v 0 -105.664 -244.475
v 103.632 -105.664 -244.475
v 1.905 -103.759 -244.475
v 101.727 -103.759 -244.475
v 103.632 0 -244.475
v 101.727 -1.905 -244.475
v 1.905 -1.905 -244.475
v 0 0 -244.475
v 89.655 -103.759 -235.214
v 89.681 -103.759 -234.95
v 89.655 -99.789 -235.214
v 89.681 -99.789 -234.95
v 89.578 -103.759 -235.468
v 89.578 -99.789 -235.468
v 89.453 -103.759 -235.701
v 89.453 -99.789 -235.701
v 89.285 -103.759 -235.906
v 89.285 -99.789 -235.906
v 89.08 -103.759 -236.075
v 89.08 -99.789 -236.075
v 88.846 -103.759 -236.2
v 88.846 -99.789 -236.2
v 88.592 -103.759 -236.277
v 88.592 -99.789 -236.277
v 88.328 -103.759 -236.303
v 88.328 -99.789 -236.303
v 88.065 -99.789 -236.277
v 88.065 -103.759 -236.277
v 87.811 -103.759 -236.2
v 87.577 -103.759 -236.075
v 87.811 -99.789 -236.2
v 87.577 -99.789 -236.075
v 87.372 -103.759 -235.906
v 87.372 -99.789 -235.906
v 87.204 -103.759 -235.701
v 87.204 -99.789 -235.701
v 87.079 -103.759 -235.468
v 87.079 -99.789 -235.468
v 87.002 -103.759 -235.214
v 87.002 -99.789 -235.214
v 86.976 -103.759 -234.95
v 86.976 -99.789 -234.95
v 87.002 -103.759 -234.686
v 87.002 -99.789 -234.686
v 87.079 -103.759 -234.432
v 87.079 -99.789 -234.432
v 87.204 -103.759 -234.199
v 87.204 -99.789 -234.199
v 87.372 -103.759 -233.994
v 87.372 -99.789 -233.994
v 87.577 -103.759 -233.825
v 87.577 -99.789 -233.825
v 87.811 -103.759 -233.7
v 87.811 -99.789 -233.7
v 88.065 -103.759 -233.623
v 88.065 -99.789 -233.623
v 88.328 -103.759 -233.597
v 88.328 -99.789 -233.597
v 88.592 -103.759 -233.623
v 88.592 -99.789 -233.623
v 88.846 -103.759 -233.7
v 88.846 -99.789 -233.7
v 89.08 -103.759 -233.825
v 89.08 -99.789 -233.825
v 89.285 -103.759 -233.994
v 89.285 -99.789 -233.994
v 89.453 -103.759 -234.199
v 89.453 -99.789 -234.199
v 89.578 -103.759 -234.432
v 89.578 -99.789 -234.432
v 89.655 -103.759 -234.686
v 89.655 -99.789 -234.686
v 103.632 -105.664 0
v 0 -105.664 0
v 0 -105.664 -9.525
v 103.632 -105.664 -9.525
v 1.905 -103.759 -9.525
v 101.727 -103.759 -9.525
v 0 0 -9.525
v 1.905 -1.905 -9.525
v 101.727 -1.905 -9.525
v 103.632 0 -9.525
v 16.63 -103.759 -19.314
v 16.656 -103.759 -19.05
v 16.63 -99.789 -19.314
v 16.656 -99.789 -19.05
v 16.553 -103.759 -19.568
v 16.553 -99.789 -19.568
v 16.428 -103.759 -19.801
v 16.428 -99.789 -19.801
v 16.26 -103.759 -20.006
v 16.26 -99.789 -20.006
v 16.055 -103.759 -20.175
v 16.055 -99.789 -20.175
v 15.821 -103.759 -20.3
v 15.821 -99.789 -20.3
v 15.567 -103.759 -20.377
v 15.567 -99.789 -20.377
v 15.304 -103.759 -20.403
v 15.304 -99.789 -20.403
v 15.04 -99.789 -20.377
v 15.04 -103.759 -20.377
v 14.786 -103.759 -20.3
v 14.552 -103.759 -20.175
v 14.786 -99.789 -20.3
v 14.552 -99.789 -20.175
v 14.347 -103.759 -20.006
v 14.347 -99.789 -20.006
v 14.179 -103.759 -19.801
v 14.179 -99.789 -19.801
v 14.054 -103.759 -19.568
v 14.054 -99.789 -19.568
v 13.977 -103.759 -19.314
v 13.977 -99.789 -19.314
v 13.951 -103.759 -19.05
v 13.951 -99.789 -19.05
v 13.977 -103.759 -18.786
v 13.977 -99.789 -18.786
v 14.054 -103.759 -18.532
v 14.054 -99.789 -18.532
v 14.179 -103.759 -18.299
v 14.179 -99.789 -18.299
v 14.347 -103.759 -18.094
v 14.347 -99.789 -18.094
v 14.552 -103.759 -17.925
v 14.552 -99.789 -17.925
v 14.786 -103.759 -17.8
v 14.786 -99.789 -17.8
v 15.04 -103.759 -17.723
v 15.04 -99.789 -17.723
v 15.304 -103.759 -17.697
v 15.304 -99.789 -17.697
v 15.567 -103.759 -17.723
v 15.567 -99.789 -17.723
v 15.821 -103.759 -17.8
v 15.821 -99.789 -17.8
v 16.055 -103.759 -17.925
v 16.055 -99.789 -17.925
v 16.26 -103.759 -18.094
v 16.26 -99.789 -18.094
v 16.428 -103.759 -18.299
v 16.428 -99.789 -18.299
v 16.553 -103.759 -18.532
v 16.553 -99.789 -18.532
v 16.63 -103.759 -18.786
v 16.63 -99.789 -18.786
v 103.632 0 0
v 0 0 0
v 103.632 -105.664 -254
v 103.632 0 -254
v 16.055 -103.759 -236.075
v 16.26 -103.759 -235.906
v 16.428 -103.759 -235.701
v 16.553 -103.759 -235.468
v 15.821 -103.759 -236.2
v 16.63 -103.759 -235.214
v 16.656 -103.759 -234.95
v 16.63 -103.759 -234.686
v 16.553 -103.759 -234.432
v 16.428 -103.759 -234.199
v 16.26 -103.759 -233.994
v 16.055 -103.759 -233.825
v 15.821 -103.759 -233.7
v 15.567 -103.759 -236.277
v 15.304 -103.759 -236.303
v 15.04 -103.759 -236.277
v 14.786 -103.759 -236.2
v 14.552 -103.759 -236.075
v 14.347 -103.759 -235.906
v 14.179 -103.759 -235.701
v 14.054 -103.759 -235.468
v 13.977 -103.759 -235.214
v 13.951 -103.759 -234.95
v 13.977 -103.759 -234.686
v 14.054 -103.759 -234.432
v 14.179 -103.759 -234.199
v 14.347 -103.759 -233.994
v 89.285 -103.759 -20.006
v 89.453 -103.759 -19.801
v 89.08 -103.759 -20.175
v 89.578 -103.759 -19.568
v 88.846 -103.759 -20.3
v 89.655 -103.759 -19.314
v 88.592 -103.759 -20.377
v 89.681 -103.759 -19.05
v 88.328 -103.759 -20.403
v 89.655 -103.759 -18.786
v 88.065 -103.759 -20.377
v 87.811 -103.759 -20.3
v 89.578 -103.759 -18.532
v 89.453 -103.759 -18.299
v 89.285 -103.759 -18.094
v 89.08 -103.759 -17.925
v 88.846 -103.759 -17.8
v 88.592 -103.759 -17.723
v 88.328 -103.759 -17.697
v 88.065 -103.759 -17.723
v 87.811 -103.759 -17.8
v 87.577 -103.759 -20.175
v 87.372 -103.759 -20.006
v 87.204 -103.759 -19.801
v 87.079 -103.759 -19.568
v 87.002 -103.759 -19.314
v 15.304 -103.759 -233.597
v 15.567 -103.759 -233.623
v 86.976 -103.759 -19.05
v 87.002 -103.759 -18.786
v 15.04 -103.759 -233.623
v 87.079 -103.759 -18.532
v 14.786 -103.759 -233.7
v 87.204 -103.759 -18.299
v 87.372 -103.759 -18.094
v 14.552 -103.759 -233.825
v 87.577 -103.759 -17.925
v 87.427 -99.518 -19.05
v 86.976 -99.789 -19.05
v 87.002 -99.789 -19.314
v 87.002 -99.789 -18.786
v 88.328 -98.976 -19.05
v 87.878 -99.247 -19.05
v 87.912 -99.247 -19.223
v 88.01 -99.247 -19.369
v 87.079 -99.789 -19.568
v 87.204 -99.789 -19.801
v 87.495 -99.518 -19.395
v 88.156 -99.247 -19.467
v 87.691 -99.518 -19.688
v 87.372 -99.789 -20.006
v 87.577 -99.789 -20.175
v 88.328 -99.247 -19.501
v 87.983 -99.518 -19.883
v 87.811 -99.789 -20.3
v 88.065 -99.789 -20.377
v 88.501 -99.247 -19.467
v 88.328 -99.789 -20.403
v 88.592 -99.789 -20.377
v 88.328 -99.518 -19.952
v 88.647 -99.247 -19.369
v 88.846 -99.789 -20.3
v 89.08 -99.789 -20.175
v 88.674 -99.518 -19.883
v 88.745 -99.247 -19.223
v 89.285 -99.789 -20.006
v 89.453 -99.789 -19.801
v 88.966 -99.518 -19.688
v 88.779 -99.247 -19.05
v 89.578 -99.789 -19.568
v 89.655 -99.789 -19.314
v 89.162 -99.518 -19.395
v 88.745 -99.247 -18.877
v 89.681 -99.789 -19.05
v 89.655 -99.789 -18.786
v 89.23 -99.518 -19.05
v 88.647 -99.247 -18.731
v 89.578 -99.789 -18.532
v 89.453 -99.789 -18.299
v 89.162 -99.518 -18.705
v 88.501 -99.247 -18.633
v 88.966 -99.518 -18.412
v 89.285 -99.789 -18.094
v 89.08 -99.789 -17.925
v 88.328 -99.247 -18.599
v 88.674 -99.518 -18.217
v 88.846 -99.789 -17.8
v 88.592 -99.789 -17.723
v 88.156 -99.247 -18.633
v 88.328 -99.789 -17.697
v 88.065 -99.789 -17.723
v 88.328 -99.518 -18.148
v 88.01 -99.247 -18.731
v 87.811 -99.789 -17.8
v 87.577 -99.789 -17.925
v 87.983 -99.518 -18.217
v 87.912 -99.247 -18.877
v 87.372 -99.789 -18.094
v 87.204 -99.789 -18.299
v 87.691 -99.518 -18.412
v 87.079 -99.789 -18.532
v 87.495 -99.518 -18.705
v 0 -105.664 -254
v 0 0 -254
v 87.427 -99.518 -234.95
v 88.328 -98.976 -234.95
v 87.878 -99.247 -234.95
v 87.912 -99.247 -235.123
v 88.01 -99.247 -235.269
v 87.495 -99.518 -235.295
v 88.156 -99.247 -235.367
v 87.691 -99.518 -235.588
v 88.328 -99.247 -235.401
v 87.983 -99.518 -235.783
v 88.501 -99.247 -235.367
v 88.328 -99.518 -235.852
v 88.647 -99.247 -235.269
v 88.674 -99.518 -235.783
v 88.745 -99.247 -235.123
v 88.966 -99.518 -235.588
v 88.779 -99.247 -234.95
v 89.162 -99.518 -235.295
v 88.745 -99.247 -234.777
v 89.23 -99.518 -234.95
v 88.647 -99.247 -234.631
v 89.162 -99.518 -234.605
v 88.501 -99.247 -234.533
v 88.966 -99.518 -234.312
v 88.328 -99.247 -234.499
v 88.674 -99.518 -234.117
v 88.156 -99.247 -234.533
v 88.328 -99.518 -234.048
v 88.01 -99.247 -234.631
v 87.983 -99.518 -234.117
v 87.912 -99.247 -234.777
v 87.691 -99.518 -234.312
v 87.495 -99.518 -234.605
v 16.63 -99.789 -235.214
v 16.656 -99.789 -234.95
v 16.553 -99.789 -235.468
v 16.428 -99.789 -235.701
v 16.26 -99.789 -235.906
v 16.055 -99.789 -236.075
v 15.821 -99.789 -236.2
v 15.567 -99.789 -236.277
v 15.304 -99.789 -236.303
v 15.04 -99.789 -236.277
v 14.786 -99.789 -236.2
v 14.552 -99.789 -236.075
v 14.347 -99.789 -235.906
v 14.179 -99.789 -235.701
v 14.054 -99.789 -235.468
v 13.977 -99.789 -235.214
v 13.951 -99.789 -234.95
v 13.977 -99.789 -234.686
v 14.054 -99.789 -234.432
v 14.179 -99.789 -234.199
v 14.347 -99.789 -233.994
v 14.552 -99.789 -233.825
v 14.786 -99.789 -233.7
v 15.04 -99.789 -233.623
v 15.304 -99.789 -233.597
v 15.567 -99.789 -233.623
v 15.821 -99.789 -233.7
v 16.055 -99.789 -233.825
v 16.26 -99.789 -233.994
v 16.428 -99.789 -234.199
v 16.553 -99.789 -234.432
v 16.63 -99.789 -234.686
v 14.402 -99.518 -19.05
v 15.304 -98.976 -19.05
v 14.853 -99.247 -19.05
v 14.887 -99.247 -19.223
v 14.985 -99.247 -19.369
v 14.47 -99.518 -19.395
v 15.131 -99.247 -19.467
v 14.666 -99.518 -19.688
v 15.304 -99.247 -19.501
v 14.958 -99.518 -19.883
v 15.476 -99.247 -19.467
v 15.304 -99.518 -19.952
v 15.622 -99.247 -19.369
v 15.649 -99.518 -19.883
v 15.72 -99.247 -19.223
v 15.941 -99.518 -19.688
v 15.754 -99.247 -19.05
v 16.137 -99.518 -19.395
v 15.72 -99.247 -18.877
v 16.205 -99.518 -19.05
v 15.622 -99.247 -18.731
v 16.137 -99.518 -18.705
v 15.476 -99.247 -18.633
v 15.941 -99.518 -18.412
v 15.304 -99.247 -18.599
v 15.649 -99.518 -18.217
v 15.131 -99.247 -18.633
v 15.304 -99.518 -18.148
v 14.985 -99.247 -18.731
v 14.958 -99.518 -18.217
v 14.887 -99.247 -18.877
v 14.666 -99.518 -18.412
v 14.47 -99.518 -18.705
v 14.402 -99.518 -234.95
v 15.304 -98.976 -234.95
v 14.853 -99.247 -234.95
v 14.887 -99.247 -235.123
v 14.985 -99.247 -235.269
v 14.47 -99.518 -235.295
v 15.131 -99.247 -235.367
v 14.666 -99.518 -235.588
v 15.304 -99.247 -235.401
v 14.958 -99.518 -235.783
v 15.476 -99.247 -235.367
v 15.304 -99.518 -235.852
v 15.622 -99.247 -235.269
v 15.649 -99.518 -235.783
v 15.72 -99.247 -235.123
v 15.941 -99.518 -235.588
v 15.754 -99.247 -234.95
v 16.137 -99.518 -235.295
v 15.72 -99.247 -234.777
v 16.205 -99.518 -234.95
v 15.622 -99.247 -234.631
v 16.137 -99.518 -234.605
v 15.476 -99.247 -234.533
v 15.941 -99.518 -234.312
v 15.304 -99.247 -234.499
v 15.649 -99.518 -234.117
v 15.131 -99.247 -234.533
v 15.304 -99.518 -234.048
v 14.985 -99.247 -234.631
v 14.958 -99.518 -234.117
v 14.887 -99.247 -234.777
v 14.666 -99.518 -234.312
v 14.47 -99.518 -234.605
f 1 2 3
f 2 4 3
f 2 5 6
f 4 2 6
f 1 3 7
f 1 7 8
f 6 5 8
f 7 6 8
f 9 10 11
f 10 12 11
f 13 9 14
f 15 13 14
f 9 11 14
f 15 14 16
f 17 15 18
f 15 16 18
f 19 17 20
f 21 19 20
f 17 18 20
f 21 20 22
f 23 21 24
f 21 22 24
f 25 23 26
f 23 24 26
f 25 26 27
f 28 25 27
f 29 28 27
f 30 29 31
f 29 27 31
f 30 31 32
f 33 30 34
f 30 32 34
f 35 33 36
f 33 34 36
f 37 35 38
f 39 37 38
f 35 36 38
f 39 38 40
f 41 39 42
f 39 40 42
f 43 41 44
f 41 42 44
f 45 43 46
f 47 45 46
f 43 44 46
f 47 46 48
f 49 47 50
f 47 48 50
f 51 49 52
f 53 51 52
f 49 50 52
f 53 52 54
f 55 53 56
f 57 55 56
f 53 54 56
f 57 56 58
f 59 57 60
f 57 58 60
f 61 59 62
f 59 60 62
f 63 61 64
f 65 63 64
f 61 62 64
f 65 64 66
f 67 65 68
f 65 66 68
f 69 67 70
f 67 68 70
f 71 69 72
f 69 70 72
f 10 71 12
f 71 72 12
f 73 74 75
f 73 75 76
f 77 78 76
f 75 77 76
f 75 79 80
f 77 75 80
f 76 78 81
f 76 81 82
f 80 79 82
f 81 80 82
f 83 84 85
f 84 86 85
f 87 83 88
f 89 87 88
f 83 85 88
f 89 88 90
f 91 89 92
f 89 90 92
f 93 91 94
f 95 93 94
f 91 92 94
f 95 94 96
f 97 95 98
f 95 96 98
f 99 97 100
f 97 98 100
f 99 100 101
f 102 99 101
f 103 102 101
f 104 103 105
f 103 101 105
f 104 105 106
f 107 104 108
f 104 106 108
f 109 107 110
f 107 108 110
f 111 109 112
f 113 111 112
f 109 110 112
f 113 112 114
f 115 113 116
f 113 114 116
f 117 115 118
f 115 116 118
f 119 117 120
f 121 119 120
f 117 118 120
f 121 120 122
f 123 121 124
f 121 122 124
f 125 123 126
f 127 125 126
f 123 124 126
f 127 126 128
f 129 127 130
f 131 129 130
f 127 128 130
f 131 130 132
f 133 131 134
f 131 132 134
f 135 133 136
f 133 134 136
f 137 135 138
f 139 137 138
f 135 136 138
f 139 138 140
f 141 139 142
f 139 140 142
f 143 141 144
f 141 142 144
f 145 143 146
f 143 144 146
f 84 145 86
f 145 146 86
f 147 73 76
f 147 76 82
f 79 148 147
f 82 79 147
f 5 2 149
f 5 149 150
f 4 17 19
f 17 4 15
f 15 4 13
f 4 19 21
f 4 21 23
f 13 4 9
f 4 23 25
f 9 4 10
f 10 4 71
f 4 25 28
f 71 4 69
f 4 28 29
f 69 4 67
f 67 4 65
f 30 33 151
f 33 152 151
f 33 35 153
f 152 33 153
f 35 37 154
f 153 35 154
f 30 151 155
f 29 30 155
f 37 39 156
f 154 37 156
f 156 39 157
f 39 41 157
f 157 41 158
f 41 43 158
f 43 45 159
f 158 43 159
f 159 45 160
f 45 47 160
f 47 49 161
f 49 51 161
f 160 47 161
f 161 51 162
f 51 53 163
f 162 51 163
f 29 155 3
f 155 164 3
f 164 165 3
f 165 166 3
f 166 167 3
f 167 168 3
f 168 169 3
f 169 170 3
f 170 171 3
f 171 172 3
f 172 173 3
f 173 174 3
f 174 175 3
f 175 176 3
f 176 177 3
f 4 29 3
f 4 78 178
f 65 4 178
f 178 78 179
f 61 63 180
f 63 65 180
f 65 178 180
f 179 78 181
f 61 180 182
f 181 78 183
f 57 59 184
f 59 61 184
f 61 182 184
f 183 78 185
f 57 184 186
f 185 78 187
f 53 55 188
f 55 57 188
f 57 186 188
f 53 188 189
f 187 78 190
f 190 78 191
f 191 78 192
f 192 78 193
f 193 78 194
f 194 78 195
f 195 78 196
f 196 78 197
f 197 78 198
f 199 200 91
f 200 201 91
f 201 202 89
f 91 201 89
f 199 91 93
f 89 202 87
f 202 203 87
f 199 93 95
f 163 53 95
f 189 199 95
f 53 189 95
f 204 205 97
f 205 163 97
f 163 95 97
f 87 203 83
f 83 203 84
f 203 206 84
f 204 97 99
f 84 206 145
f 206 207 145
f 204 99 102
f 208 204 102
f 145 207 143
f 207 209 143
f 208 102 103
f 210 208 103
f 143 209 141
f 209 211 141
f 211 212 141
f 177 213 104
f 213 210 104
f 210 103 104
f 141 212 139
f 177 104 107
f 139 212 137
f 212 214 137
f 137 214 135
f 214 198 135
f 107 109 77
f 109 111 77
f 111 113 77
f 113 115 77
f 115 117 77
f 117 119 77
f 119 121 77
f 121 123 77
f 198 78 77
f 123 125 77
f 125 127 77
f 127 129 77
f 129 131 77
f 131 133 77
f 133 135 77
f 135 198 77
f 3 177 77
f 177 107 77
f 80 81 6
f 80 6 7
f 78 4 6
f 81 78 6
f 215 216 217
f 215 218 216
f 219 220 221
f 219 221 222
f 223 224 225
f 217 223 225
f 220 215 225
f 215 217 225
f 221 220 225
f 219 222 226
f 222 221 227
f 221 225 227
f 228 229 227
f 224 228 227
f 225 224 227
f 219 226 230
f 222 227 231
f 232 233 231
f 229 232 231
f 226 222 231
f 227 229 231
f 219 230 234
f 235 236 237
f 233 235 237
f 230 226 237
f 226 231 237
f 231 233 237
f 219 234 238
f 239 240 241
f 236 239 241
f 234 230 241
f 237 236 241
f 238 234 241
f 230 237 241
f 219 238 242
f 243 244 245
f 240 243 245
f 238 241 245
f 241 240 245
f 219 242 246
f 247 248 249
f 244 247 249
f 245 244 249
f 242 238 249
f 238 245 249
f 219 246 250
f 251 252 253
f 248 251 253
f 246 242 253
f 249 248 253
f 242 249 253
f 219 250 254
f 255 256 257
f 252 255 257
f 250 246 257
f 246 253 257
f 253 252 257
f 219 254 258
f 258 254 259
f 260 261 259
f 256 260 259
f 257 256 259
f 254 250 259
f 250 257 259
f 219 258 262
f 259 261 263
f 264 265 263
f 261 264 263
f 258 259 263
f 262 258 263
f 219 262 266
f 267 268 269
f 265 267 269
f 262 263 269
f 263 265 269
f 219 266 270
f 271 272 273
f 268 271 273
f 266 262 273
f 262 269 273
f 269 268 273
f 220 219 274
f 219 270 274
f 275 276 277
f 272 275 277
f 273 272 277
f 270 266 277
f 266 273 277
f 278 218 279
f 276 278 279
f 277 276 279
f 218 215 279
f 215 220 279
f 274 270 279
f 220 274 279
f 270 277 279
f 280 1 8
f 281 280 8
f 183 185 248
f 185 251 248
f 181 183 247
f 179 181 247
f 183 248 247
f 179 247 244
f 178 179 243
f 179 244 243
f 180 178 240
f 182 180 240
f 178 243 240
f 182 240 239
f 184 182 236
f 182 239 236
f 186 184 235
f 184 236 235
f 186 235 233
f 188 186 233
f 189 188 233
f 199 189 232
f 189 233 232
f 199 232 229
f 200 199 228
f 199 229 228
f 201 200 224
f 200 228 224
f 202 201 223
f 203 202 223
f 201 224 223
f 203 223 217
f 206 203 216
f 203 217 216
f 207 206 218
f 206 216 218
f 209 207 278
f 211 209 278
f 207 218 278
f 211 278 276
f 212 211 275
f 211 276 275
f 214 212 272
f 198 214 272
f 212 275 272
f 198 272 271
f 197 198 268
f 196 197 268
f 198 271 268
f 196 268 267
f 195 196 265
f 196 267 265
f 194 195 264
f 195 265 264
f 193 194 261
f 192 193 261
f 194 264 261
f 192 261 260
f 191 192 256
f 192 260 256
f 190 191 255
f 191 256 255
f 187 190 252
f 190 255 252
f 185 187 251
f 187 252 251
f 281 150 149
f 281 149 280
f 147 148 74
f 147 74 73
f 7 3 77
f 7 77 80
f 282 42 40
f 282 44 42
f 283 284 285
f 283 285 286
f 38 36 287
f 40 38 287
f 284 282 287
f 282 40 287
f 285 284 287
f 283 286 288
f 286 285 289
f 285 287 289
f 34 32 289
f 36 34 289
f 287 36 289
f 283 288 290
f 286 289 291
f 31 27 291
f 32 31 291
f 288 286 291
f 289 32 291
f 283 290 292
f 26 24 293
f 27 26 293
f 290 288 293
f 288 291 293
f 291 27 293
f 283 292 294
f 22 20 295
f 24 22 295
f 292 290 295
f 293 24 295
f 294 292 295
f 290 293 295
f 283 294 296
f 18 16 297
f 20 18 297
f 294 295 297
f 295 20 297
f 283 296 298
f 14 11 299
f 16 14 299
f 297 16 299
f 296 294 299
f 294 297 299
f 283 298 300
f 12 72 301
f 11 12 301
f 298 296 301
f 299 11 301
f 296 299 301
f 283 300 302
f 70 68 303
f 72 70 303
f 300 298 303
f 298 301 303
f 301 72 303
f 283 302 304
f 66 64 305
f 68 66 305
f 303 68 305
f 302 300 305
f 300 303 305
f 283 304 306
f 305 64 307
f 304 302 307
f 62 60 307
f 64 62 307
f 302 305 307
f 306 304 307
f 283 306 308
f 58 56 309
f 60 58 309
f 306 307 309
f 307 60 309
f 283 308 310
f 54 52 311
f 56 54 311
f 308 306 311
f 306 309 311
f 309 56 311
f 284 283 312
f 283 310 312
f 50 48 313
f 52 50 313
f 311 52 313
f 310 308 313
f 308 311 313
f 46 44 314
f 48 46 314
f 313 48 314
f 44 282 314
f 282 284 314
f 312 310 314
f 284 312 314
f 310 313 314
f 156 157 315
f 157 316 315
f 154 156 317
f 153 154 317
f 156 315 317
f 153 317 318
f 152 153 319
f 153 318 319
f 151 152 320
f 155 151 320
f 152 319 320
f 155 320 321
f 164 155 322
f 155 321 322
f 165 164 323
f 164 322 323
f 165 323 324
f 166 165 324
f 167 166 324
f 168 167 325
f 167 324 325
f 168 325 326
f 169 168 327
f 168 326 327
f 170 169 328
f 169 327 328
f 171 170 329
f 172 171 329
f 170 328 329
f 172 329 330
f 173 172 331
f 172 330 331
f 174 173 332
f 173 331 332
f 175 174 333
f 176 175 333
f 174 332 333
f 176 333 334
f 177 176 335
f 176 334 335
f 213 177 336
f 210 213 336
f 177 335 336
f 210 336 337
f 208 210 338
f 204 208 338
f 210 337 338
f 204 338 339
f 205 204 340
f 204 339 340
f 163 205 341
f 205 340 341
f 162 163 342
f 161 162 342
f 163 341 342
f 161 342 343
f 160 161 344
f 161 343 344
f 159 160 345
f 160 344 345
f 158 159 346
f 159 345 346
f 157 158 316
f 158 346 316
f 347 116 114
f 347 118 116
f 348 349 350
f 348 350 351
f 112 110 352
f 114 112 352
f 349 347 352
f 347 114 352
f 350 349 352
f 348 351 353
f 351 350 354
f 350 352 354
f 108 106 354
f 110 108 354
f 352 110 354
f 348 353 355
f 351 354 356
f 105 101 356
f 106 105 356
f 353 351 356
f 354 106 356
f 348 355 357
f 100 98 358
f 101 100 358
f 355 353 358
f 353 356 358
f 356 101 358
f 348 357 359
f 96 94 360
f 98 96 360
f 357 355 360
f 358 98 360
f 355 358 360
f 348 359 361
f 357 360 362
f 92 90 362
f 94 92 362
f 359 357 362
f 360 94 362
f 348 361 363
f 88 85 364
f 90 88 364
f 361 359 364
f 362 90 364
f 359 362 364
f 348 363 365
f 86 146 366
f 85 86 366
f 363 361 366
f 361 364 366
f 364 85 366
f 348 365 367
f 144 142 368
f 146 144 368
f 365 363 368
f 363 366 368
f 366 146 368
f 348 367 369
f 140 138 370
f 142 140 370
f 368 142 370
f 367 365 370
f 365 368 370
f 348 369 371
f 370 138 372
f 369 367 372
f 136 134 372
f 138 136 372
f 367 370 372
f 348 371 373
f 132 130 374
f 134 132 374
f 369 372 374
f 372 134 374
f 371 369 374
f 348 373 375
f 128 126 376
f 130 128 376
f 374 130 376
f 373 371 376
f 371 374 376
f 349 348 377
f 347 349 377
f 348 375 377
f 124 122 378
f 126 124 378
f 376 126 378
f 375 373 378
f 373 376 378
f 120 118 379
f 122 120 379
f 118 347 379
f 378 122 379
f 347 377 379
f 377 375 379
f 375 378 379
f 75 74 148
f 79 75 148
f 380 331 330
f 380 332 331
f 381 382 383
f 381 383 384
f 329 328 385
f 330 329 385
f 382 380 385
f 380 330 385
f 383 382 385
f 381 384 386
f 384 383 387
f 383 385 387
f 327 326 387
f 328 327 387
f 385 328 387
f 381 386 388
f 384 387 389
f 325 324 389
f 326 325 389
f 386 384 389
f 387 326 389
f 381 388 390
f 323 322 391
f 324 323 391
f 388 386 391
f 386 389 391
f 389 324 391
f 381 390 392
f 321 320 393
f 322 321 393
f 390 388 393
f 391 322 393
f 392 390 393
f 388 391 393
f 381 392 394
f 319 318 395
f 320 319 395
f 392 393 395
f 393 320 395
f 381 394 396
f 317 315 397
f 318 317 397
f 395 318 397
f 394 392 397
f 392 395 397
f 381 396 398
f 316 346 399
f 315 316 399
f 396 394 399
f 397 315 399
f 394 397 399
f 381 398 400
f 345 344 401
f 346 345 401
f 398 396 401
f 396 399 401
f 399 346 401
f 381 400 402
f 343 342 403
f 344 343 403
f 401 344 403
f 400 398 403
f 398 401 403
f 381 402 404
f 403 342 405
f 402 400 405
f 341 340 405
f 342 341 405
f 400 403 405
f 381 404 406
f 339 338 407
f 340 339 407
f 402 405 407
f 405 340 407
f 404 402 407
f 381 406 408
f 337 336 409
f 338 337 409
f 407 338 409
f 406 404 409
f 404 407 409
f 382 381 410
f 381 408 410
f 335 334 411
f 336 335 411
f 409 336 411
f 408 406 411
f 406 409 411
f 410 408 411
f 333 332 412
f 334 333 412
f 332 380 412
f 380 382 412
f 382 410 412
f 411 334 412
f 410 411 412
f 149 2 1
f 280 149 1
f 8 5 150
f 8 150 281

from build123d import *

# Parameters (mm, degrees)
SKETCH1_W                     = 103.632
SKETCH1_H                     = 105.664
BOSS_EXTRUDE1_DEPTH           = 9.525
SKETCH2_W                     = 99.822
SKETCH2_H                     = 101.854
BOSS_EXTRUDE2_DEPTH           = 234.95
SKETCH4_W                     = 103.632
SKETCH4_H                     = 105.664
BOSS_EXTRUDE5_DEPTH           = 9.525
TAP_DRILL_FOR_6_32_TAP1_D     = 2.7051
TAP_DRILL_FOR_6_32_TAP1_DEPTH = 3.97002
TAP_DRILL_FOR_6_32_TAP1_TIP   = 0.81269403


with BuildPart() as part:
    # Sketch1 → Boss-Extrude1 (new body)
    with BuildSketch(Plane.XY):
        with Locations((51.816, -52.832)):
            Rectangle(SKETCH1_W, SKETCH1_H)
    extrude(amount=-BOSS_EXTRUDE1_DEPTH)

    # Sketch2 → Boss-Extrude2 (add)
    with BuildSketch(Plane(origin=(0, 0, -9.525), x_dir=(-1, 0, 0), z_dir=(0, 0, -1))):
        with Locations((-51.816, -52.832)):
            Rectangle(SKETCH2_W, SKETCH2_H)
    extrude(amount=BOSS_EXTRUDE2_DEPTH)

    # Sketch4 → Boss-Extrude5 (add)
    with BuildSketch(Plane(origin=(0, 0, -244.475), x_dir=(-1, 0, 0), z_dir=(0, 0, -1))):
        with Locations((-51.816, -52.832)):
            Rectangle(SKETCH4_W, SKETCH4_H)
    extrude(amount=BOSS_EXTRUDE5_DEPTH)

    # Tap Drill for #6-32 Tap1
    with Locations(Plane(origin=(0, -103.759, 0), x_dir=(-1, 0, 0), z_dir=(0, -1, 0))):
        with Locations((-88.3285, 234.95), (-15.3035, 234.95), (-88.3285, 19.05), (-15.3035, 19.05)):
            Hole(TAP_DRILL_FOR_6_32_TAP1_D / 2, depth=TAP_DRILL_FOR_6_32_TAP1_DEPTH)
            with Locations((0, 0, -(TAP_DRILL_FOR_6_32_TAP1_DEPTH + TAP_DRILL_FOR_6_32_TAP1_TIP / 2))):  # 118° drill point
                Cone(0, TAP_DRILL_FOR_6_32_TAP1_D / 2, TAP_DRILL_FOR_6_32_TAP1_TIP, mode=Mode.SUBTRACT)


solid = part.part
